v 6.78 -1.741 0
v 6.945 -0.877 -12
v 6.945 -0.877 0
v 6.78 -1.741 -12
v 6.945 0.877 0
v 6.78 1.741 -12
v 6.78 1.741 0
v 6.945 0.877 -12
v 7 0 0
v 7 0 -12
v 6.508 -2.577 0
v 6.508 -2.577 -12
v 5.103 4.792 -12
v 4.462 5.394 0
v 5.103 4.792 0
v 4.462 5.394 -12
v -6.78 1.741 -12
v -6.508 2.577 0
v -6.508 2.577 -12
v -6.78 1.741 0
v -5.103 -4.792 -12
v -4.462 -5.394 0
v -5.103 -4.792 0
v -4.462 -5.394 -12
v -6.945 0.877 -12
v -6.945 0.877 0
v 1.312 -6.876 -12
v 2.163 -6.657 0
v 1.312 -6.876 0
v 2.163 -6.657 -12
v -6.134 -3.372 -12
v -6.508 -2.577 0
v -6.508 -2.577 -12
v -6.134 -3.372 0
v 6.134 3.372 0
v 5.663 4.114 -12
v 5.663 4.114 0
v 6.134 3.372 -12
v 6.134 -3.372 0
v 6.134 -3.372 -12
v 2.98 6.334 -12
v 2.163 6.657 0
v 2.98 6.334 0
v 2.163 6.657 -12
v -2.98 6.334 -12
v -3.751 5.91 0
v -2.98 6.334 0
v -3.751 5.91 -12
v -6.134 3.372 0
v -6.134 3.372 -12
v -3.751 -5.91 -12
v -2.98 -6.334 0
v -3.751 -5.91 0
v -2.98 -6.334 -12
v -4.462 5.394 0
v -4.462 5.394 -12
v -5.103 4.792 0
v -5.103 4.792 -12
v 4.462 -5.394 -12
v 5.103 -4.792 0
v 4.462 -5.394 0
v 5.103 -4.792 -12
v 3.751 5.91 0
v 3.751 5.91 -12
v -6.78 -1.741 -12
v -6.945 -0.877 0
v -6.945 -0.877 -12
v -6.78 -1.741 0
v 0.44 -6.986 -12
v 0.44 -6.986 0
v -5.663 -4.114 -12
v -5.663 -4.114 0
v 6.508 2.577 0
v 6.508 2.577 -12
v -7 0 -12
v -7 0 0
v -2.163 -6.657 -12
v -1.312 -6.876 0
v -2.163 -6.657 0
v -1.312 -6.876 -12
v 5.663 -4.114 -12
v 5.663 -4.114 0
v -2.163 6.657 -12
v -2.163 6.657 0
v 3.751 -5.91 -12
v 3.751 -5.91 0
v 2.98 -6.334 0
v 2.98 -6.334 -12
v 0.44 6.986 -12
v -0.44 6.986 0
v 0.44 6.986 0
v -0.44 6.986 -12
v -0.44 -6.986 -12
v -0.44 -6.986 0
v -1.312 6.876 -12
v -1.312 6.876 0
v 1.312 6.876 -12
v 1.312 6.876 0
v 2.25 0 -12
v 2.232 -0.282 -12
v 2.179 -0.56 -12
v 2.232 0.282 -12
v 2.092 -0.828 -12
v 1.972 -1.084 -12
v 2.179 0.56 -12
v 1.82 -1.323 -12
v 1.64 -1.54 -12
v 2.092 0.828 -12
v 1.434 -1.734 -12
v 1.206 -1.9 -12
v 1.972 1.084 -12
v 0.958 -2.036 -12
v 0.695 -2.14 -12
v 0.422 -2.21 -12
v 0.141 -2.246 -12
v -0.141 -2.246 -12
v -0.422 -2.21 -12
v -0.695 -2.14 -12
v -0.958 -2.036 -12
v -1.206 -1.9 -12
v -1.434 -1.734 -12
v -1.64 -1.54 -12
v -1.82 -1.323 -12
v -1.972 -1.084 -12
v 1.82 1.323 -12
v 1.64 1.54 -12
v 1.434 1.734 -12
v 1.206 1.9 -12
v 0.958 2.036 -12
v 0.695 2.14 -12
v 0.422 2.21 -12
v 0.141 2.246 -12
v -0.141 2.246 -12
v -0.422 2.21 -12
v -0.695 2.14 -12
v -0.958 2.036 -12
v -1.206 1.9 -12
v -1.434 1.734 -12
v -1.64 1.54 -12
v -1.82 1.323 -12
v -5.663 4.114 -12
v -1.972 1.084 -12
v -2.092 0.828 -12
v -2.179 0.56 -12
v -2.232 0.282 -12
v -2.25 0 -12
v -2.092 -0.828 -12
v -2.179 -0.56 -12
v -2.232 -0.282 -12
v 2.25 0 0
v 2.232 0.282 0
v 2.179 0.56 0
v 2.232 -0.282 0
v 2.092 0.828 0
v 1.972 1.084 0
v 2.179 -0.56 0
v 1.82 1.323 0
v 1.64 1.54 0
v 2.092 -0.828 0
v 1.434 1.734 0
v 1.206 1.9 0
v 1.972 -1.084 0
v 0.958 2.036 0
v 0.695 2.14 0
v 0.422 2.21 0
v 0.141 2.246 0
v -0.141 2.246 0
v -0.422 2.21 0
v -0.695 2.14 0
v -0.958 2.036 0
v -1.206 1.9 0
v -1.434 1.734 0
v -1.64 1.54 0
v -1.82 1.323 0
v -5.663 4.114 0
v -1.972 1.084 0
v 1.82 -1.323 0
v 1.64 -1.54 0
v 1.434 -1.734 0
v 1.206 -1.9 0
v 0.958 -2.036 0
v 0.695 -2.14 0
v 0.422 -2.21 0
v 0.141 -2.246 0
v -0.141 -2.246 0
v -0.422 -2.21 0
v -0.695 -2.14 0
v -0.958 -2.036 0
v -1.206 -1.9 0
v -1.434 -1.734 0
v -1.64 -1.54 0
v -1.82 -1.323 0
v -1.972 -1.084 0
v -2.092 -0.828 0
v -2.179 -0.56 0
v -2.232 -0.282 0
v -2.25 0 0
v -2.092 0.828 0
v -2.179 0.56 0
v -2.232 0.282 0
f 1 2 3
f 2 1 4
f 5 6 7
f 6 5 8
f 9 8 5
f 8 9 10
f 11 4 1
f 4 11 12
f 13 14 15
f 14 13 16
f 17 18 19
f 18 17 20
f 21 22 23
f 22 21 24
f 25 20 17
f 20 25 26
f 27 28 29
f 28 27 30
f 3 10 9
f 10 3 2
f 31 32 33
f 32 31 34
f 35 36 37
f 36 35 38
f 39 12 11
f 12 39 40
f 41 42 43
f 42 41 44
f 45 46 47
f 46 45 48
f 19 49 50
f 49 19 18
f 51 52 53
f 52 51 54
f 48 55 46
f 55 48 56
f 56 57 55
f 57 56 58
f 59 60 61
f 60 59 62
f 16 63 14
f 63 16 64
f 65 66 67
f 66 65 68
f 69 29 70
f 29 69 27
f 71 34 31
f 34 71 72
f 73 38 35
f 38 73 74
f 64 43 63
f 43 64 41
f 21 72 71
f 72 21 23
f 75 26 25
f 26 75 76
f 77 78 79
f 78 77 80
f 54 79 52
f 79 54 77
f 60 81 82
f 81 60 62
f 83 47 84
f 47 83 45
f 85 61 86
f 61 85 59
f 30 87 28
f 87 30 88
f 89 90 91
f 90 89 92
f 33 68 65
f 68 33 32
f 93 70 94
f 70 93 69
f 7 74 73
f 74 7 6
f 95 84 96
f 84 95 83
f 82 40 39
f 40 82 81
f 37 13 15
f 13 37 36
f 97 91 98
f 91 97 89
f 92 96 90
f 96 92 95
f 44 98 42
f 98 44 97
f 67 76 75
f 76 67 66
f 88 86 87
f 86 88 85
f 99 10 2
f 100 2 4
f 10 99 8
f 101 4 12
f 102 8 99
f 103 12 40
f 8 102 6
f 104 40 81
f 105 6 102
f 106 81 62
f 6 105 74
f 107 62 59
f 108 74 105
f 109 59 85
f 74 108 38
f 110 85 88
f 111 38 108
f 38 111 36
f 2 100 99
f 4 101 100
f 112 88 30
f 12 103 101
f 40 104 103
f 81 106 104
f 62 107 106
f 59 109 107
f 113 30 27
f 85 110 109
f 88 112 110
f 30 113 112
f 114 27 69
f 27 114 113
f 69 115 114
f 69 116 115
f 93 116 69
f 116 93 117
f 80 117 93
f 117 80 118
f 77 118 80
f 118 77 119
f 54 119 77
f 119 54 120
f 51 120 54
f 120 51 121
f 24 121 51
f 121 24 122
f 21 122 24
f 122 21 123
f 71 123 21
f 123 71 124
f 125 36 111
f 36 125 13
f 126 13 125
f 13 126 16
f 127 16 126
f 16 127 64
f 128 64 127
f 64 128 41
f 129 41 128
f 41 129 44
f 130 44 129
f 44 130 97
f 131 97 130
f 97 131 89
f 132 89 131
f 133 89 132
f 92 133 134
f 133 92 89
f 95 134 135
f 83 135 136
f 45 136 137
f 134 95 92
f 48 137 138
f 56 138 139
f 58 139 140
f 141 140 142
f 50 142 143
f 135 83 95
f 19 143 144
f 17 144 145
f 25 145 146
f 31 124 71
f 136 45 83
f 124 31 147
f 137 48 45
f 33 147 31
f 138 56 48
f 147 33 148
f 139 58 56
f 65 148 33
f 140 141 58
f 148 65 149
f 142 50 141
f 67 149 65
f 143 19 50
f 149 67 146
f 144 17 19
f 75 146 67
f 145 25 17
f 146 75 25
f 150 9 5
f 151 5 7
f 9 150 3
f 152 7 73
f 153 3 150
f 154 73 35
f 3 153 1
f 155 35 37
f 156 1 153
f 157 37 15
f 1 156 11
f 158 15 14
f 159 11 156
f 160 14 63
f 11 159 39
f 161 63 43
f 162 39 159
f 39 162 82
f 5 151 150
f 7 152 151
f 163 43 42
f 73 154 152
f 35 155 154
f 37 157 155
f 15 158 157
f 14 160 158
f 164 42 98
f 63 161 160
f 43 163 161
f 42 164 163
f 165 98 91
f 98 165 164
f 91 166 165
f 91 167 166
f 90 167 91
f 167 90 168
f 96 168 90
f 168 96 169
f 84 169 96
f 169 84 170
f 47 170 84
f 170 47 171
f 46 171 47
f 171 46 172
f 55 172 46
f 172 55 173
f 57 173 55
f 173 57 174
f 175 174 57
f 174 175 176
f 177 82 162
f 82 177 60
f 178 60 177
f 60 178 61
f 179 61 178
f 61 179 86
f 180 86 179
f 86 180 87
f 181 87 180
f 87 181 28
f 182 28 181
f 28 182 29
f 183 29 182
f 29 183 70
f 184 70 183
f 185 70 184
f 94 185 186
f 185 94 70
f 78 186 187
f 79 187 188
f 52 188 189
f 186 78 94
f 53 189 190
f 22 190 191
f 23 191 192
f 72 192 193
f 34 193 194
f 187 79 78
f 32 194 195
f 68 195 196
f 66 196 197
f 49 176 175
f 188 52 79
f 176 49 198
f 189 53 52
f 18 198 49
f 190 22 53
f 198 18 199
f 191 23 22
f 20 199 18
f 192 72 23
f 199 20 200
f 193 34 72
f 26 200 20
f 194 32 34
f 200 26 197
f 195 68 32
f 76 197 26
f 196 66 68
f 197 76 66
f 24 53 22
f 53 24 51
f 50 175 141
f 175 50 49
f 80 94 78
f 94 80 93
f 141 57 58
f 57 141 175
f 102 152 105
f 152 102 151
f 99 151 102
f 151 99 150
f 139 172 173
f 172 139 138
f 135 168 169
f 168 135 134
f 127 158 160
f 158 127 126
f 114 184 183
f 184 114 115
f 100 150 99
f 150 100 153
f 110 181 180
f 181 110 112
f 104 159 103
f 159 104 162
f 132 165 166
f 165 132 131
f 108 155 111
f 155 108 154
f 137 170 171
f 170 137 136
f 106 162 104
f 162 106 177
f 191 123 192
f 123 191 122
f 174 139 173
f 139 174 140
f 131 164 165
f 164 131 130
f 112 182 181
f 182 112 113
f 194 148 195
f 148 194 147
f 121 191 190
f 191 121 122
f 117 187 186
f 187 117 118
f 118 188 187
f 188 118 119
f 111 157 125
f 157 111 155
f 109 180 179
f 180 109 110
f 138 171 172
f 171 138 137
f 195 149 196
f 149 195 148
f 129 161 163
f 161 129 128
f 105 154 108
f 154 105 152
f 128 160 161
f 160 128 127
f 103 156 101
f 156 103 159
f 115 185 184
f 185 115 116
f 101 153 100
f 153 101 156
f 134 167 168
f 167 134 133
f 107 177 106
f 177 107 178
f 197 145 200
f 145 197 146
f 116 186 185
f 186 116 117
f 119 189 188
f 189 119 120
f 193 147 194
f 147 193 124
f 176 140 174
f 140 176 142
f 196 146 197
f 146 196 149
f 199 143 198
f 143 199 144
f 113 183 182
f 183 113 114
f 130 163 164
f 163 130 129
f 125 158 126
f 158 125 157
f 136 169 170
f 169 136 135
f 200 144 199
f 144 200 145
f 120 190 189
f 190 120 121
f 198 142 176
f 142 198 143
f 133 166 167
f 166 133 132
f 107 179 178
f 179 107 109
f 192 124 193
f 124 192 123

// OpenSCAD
$fn = 50;


difference() {
	union() {
		translate(v = [0, 0, -12.0000000000]) {
			cylinder(h = 12, r = 7.0000000000);
		}
		cylinder(h = 0, r = 16.0000000000);
	}
	union() {
		#translate(v = [0, 0, -12]) {
			cylinder(h = 12, r = 2.2500000000);
		}
	}
}
